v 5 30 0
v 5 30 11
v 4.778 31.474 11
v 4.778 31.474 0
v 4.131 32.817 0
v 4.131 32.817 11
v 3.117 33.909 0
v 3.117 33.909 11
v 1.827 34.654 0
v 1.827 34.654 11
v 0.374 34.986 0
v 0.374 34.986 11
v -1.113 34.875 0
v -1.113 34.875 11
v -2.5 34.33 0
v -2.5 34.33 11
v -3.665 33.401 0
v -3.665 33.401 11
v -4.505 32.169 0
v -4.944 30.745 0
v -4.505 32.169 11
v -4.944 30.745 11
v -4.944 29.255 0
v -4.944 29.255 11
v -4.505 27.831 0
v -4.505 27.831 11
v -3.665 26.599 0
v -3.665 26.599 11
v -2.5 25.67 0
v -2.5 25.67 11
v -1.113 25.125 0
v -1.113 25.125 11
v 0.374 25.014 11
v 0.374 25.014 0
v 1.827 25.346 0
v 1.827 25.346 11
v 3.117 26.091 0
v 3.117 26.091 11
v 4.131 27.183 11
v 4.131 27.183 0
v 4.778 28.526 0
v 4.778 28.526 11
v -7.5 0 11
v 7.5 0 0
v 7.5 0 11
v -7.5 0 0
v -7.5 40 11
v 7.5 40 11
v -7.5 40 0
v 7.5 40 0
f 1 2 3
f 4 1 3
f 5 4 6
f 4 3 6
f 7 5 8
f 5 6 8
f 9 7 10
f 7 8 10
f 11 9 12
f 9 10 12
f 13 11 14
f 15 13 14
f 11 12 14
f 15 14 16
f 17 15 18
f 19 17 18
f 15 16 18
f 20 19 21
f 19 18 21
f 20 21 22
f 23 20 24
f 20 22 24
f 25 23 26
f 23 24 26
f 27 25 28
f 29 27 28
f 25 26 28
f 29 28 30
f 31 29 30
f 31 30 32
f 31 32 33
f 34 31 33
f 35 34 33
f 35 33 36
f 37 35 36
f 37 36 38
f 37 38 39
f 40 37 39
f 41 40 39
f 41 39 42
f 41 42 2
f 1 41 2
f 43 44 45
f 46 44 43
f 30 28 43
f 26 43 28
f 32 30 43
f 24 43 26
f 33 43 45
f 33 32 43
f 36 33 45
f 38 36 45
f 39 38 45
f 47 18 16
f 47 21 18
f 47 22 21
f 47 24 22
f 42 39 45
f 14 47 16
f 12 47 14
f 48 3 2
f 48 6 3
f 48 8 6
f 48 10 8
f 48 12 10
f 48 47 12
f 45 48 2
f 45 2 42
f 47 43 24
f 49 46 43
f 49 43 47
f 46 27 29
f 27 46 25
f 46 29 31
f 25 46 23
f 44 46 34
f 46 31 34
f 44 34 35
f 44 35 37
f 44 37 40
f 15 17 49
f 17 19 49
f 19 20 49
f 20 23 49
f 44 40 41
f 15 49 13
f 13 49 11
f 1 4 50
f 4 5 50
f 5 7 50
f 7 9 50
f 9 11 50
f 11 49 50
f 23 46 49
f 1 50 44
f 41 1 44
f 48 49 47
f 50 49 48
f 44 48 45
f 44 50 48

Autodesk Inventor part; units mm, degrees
ref_plane "YZ Plane" through (0, 0, 0) normal (1, 0, 0) x (0, 1, 0)
ref_plane "XZ Plane" through (0, 0, 0) normal (0, 1, 0) x (-1, 0, 0)
ref_plane "XY Plane" through (0, 0, 0) normal (0, 0, 1) x (1, 0, 0)
sketch "Sketch1" plane through (0, 0, 0) normal (0, 0, 1) x (1, 0, 0)
  line L0 (-7.5, 40) -> (7.5, 40)
  line L1 (7.5, 40) -> (7.5, 0)
  line L2 (7.5, 0) -> (-7.5, 0)
  line L3 (-7.5, 0) -> (-7.5, 40)
  line L4 (-10.7602, 0) -> (12.0613, 0) projected
  line L5 (0, -8) -> (0, 48) projected
  point P0 (0, 0)
  dimension "d4" = 7.5
  dimension "d5" = 7.5
  dimension "d6" = 40
  dimension "d7" = 0
extrude "Extrusion1" add sketch "Sketch1" along normal blind 11
sketch "Sketch3" plane through (-7.5, 0, 0) normal (0, -1, 0) x (1, 0, 0)
  line L0 (0, 0) -> (0, 11) projected
  line L1 (0, 5.5) -> (13.8011, 5.5)
  line L2 (0, 11) -> (15, 11) projected
  circle A0 centre (5, 5.5) radius 1
  point P0 (7.5, 0)
  dimension "d11" = 5.5
  dimension "d12" = 2
sketch "Sketch4" plane through (0, 0, 11) normal (0, 0, 1) x (1, 0, 0)
  circle A0 centre (0, 30) radius 5
  line L0 (-7.5, 0) -> (7.5, 0) projected
  point P0 (0, 0)
  dimension "d13" = 10
  dimension "d14" = 30
extrude "Extrusion3" cut sketch "Sketch4" against normal through all
properties part number "mallet_support"
